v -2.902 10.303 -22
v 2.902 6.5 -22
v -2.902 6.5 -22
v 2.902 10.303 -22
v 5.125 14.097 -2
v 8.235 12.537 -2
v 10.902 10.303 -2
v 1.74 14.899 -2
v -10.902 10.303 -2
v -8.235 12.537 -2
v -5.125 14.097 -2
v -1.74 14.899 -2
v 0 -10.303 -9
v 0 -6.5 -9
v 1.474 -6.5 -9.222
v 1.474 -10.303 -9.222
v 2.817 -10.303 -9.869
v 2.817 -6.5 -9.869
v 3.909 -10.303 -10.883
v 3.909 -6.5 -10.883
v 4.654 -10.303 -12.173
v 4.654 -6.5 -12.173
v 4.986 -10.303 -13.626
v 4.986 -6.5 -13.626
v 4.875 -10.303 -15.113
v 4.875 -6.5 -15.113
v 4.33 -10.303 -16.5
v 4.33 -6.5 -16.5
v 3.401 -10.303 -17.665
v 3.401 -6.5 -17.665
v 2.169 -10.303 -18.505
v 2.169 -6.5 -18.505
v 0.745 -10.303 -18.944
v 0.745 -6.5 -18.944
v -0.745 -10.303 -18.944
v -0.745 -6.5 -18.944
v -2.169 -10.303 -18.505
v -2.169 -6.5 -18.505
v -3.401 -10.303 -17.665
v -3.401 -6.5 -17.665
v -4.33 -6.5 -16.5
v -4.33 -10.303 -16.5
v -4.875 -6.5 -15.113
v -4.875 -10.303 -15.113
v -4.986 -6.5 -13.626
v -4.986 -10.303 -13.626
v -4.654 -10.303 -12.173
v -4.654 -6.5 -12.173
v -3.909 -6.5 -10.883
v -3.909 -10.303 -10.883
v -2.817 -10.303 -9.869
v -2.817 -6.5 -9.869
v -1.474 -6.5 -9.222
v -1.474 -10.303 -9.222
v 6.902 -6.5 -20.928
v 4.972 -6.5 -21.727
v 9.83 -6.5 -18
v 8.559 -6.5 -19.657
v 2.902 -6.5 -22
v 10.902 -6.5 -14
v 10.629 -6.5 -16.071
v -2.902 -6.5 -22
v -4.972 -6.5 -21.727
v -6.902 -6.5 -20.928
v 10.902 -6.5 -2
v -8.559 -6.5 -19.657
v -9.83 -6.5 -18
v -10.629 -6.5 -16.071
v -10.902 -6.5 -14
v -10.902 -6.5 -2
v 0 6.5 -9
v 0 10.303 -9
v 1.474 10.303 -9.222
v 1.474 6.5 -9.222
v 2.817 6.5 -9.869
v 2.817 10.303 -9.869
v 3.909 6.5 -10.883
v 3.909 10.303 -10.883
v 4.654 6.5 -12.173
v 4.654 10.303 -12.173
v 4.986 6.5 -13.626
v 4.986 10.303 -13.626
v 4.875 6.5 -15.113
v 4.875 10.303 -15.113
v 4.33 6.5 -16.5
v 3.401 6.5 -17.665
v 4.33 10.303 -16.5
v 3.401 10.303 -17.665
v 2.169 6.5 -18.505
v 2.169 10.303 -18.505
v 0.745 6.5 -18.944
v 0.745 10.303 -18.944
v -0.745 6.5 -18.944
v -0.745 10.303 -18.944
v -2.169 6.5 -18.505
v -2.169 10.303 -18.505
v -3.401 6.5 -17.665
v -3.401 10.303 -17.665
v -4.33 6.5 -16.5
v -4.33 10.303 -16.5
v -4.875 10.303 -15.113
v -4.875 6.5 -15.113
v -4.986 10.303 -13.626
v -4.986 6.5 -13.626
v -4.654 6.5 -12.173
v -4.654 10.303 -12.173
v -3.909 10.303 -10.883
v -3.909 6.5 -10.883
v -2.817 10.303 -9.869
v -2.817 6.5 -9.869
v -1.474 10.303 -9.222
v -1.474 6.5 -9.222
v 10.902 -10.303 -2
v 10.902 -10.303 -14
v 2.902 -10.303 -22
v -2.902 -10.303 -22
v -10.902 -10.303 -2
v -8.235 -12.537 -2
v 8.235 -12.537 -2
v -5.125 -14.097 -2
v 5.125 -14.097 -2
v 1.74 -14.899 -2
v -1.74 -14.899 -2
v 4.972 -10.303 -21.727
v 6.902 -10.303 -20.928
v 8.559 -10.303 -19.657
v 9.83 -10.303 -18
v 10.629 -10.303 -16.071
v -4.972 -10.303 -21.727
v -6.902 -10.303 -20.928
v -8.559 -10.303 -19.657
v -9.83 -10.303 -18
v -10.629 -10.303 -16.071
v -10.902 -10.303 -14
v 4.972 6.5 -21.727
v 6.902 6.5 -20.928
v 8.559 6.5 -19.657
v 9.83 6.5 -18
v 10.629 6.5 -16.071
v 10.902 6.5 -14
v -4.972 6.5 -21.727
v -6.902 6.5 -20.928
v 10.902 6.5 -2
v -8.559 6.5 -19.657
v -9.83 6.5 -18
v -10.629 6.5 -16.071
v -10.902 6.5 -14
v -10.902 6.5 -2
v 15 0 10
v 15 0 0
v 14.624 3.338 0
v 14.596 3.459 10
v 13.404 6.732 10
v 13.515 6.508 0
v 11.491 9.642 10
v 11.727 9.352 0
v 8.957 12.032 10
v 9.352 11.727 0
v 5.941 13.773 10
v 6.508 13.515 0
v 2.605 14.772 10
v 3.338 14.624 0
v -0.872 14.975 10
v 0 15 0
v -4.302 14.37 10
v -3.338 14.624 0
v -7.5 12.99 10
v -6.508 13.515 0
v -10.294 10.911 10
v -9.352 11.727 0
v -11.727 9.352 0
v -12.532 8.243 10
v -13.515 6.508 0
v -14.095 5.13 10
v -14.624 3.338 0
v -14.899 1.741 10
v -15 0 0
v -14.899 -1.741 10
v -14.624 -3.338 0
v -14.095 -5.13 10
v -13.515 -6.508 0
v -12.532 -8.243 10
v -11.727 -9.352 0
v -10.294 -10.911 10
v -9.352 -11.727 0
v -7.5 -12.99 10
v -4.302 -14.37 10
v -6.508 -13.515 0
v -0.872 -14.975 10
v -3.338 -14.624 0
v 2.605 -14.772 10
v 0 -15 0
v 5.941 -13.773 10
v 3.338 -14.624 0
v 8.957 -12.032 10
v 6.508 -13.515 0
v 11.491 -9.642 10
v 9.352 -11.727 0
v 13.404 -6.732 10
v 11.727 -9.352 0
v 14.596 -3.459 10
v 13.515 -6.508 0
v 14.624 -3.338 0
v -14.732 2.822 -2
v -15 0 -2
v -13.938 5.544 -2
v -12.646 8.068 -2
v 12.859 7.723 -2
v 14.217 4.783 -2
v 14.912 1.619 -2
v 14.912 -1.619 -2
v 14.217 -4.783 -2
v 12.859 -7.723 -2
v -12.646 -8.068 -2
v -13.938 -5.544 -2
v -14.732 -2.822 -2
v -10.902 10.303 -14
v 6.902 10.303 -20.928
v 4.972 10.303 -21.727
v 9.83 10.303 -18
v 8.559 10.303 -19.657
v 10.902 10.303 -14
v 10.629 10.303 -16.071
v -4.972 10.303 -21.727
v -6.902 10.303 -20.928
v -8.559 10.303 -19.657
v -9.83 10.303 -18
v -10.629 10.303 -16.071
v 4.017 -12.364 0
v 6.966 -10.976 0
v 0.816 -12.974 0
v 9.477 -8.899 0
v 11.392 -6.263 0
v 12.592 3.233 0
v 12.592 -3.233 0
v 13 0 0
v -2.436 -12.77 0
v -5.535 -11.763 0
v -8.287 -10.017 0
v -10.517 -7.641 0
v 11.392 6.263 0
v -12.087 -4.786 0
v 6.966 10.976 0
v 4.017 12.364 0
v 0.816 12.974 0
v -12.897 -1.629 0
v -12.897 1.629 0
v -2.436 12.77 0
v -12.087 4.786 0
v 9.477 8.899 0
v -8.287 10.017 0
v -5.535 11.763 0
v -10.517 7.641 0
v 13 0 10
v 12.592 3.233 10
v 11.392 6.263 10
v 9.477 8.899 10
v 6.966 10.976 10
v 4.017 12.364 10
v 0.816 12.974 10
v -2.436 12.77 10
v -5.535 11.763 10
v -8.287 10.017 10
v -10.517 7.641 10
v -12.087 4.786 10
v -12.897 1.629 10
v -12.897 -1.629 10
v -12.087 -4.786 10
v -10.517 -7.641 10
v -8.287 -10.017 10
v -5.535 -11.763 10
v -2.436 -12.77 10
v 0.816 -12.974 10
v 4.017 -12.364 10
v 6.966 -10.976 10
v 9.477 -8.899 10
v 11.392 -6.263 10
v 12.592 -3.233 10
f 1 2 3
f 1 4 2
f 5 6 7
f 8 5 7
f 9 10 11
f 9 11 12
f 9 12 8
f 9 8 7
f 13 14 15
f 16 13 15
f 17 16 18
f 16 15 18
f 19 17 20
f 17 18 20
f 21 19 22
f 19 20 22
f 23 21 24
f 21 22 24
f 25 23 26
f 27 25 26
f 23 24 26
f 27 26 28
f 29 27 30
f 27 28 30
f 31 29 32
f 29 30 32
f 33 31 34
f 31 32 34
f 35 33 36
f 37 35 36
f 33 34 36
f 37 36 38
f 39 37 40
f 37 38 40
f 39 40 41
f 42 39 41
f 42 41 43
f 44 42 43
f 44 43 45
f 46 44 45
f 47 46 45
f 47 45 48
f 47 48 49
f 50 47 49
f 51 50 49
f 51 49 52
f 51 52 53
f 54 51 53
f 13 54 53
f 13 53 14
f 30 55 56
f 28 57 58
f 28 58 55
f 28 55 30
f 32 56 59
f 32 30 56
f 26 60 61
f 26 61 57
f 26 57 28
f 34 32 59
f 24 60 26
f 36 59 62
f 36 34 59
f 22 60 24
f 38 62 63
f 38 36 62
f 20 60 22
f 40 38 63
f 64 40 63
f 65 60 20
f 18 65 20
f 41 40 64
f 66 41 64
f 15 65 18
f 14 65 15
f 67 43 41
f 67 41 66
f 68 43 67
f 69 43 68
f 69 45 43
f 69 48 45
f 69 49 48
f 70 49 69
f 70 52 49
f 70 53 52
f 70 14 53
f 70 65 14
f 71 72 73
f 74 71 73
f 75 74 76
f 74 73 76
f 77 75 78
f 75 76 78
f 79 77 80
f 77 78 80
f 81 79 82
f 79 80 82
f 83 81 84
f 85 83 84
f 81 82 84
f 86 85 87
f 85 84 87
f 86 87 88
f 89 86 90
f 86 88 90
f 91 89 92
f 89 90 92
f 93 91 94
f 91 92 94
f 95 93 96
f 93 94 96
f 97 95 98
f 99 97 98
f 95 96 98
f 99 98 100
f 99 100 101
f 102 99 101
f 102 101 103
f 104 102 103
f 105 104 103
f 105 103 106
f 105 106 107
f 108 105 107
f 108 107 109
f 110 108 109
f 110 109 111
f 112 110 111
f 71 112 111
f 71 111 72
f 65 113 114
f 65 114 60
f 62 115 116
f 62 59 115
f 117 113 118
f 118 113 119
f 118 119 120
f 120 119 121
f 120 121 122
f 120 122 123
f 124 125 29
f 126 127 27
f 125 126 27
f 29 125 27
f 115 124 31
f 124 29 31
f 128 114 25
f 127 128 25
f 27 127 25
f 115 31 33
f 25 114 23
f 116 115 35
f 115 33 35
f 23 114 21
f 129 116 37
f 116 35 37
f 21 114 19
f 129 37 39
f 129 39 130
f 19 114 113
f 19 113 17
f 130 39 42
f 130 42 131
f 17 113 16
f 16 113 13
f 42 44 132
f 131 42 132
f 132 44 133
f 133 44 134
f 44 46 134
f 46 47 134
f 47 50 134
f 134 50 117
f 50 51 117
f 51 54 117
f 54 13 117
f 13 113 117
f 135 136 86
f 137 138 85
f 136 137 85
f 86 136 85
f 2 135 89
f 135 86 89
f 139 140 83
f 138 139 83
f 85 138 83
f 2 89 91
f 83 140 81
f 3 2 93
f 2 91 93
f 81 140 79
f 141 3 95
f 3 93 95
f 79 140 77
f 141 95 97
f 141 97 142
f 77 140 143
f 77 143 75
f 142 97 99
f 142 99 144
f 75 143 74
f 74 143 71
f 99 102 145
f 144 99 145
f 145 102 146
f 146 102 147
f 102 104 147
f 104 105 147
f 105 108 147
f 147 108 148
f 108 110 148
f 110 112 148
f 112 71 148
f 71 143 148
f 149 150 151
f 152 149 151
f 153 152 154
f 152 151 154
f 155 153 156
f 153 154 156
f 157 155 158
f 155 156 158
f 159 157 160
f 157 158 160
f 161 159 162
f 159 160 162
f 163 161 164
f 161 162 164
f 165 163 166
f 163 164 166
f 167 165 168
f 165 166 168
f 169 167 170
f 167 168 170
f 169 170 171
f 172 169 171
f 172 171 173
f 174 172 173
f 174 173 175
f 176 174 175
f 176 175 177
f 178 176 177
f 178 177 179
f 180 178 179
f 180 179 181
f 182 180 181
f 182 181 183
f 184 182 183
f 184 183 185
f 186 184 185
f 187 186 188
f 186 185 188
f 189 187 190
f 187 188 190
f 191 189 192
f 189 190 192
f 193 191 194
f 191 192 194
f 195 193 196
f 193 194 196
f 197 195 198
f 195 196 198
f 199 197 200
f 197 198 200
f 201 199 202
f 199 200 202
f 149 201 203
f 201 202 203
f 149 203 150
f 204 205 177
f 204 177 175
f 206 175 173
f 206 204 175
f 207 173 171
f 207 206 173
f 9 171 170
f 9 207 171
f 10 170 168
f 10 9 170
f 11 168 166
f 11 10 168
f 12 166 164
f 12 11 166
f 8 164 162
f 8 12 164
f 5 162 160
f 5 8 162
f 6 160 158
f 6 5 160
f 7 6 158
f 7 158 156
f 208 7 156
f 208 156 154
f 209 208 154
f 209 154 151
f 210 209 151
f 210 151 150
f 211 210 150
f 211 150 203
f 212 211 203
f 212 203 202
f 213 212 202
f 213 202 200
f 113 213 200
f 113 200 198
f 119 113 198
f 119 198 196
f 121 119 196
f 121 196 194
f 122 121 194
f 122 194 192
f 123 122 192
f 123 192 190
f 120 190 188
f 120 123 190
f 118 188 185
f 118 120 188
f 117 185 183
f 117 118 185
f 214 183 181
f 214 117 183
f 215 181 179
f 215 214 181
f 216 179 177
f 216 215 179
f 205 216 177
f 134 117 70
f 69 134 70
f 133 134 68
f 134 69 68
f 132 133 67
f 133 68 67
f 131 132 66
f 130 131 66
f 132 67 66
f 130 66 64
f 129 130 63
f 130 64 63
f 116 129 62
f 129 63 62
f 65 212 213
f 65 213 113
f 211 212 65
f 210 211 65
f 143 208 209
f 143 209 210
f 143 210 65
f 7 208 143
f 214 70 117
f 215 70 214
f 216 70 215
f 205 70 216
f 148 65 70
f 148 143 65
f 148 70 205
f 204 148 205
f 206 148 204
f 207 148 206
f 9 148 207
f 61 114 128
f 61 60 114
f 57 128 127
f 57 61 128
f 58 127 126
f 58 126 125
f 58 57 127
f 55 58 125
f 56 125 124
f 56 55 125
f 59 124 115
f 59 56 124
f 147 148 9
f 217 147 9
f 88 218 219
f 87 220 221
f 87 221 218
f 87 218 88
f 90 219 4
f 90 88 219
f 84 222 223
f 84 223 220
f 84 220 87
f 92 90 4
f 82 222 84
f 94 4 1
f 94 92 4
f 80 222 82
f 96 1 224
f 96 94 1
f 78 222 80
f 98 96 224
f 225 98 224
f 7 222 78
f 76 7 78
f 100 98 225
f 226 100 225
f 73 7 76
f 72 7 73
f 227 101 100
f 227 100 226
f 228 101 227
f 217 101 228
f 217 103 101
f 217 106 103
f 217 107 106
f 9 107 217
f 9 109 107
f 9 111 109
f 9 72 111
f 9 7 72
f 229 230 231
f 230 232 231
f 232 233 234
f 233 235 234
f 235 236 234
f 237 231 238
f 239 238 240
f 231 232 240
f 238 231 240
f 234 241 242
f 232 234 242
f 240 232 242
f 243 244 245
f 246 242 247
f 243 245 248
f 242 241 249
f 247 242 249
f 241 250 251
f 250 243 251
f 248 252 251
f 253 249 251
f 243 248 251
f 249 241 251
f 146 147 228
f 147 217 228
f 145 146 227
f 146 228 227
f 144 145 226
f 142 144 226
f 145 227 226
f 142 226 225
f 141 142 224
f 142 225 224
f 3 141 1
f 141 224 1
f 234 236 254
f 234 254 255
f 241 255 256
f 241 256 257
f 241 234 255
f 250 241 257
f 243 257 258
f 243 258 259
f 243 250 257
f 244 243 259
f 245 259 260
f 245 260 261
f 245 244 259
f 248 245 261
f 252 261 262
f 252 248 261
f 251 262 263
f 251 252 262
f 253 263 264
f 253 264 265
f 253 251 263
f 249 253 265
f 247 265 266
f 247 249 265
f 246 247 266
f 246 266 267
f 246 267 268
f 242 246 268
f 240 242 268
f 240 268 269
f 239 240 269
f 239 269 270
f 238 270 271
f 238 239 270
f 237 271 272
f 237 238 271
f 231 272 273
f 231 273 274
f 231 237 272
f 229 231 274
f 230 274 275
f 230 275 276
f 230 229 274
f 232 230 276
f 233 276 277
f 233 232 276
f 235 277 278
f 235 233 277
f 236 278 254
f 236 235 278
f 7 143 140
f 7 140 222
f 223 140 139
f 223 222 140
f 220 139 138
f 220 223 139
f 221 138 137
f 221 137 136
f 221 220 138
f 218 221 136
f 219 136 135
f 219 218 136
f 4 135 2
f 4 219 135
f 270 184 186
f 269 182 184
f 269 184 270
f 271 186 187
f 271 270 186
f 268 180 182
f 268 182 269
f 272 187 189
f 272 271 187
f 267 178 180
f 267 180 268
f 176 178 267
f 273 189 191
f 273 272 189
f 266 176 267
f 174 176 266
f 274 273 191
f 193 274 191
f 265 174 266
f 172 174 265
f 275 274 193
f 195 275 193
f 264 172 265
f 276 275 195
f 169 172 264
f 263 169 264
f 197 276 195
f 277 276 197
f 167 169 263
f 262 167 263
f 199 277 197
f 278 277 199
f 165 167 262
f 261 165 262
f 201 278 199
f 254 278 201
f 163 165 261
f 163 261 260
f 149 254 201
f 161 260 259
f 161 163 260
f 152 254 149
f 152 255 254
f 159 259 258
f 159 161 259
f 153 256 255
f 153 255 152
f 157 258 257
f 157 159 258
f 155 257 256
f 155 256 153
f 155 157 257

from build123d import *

# Parameters (mm, degrees)
SKETCH1_R           = 15
SKETCH1_R_2         = 13
BOSS_EXTRUDE1_DEPTH = 10
SKETCH1_2_R         = 15
SKETCH1_2_R_2       = 13
BOSS_EXTRUDE2_DEPTH = 10
BOSS_EXTRUDE3_START = 2
SKETCH2_R           = 15
BOSS_EXTRUDE3_DEPTH = 2
SKETCH3_W           = 21.803591486
SKETCH3_H           = 3.802953439
BOSS_EXTRUDE4_DEPTH = 20
FILLET1_R           = 8
CUT_EXTRUDE1_REACH  = 38.732
SKETCH4_R           = 5


with BuildPart() as part:
    # Sketch1 → Boss-Extrude1 (new body)
    with BuildSketch(Plane.XY):
        Circle(SKETCH1_R)
        Circle(SKETCH1_R_2, mode=Mode.SUBTRACT)
    extrude(amount=BOSS_EXTRUDE1_DEPTH)

    # Sketch1<2> → Boss-Extrude2 (add)
    with BuildSketch(Plane.XY):
        Circle(SKETCH1_2_R)
        Circle(SKETCH1_2_R_2, mode=Mode.SUBTRACT)
    extrude(amount=BOSS_EXTRUDE2_DEPTH)

    # Sketch2 → Boss-Extrude3 (add)
    with BuildSketch(Plane(origin=(0, 0, 0), x_dir=(-1, 0, 0), z_dir=(0, 0, -1)).offset(BOSS_EXTRUDE3_START)):
        Circle(SKETCH2_R)
    extrude(amount=-BOSS_EXTRUDE3_DEPTH)

    # Sketch3 → Boss-Extrude4 (add)
    with BuildSketch(Plane(origin=(0, 0, -2), x_dir=(-1, 0, 0), z_dir=(0, 0, -1))):
        with Locations((0, -8.401476719)):
            Rectangle(SKETCH3_W, SKETCH3_H)
        with Locations((0, 8.401476719)):
            Rectangle(SKETCH3_W, SKETCH3_H)
    extrude(amount=BOSS_EXTRUDE4_DEPTH)

    # Fillet1
    fillet1_edges = [part.edges().sort_by_distance(p)[0] for p in [
        (-10.901795743, -8.40147672, -22),
        (10.901795743, -8.40147672, -22),
        (10.901795743, 8.40147672, -22),
        (-10.901795743, 8.40147672, -22),
    ]]
    fillet(fillet1_edges, radius=FILLET1_R)

    # Cut-Extrude1: up to this face of the body (flat: up to its plane)
    cut_extrude1_end = Plane(part.part.faces().sort_by_distance((0, -10.302953439, -11.447862962))[0])
    # Sketch4 → Cut-Extrude1 (cut, up to the picked face)
    with BuildSketch(Plane(origin=(0, 10.302953439, 0), x_dir=(1, 0, 0), z_dir=(0, 1, 0)), mode=Mode.PRIVATE) as cut_extrude1_sk1:
        with Locations(Location((0, 14, 0), (0, 0, 270))):
            Circle(SKETCH4_R)
    cut_extrude1_tool1 = split(extrude(cut_extrude1_sk1.sketch, amount=-CUT_EXTRUDE1_REACH, mode=Mode.PRIVATE), bisect_by=cut_extrude1_end, keep=Keep.BOTH, mode=Mode.PRIVATE)
    add(cut_extrude1_tool1.solids().sort_by(Axis((0, 10.302953, -14), (0, -1, 0)))[0], mode=Mode.SUBTRACT)


solid = part.part
